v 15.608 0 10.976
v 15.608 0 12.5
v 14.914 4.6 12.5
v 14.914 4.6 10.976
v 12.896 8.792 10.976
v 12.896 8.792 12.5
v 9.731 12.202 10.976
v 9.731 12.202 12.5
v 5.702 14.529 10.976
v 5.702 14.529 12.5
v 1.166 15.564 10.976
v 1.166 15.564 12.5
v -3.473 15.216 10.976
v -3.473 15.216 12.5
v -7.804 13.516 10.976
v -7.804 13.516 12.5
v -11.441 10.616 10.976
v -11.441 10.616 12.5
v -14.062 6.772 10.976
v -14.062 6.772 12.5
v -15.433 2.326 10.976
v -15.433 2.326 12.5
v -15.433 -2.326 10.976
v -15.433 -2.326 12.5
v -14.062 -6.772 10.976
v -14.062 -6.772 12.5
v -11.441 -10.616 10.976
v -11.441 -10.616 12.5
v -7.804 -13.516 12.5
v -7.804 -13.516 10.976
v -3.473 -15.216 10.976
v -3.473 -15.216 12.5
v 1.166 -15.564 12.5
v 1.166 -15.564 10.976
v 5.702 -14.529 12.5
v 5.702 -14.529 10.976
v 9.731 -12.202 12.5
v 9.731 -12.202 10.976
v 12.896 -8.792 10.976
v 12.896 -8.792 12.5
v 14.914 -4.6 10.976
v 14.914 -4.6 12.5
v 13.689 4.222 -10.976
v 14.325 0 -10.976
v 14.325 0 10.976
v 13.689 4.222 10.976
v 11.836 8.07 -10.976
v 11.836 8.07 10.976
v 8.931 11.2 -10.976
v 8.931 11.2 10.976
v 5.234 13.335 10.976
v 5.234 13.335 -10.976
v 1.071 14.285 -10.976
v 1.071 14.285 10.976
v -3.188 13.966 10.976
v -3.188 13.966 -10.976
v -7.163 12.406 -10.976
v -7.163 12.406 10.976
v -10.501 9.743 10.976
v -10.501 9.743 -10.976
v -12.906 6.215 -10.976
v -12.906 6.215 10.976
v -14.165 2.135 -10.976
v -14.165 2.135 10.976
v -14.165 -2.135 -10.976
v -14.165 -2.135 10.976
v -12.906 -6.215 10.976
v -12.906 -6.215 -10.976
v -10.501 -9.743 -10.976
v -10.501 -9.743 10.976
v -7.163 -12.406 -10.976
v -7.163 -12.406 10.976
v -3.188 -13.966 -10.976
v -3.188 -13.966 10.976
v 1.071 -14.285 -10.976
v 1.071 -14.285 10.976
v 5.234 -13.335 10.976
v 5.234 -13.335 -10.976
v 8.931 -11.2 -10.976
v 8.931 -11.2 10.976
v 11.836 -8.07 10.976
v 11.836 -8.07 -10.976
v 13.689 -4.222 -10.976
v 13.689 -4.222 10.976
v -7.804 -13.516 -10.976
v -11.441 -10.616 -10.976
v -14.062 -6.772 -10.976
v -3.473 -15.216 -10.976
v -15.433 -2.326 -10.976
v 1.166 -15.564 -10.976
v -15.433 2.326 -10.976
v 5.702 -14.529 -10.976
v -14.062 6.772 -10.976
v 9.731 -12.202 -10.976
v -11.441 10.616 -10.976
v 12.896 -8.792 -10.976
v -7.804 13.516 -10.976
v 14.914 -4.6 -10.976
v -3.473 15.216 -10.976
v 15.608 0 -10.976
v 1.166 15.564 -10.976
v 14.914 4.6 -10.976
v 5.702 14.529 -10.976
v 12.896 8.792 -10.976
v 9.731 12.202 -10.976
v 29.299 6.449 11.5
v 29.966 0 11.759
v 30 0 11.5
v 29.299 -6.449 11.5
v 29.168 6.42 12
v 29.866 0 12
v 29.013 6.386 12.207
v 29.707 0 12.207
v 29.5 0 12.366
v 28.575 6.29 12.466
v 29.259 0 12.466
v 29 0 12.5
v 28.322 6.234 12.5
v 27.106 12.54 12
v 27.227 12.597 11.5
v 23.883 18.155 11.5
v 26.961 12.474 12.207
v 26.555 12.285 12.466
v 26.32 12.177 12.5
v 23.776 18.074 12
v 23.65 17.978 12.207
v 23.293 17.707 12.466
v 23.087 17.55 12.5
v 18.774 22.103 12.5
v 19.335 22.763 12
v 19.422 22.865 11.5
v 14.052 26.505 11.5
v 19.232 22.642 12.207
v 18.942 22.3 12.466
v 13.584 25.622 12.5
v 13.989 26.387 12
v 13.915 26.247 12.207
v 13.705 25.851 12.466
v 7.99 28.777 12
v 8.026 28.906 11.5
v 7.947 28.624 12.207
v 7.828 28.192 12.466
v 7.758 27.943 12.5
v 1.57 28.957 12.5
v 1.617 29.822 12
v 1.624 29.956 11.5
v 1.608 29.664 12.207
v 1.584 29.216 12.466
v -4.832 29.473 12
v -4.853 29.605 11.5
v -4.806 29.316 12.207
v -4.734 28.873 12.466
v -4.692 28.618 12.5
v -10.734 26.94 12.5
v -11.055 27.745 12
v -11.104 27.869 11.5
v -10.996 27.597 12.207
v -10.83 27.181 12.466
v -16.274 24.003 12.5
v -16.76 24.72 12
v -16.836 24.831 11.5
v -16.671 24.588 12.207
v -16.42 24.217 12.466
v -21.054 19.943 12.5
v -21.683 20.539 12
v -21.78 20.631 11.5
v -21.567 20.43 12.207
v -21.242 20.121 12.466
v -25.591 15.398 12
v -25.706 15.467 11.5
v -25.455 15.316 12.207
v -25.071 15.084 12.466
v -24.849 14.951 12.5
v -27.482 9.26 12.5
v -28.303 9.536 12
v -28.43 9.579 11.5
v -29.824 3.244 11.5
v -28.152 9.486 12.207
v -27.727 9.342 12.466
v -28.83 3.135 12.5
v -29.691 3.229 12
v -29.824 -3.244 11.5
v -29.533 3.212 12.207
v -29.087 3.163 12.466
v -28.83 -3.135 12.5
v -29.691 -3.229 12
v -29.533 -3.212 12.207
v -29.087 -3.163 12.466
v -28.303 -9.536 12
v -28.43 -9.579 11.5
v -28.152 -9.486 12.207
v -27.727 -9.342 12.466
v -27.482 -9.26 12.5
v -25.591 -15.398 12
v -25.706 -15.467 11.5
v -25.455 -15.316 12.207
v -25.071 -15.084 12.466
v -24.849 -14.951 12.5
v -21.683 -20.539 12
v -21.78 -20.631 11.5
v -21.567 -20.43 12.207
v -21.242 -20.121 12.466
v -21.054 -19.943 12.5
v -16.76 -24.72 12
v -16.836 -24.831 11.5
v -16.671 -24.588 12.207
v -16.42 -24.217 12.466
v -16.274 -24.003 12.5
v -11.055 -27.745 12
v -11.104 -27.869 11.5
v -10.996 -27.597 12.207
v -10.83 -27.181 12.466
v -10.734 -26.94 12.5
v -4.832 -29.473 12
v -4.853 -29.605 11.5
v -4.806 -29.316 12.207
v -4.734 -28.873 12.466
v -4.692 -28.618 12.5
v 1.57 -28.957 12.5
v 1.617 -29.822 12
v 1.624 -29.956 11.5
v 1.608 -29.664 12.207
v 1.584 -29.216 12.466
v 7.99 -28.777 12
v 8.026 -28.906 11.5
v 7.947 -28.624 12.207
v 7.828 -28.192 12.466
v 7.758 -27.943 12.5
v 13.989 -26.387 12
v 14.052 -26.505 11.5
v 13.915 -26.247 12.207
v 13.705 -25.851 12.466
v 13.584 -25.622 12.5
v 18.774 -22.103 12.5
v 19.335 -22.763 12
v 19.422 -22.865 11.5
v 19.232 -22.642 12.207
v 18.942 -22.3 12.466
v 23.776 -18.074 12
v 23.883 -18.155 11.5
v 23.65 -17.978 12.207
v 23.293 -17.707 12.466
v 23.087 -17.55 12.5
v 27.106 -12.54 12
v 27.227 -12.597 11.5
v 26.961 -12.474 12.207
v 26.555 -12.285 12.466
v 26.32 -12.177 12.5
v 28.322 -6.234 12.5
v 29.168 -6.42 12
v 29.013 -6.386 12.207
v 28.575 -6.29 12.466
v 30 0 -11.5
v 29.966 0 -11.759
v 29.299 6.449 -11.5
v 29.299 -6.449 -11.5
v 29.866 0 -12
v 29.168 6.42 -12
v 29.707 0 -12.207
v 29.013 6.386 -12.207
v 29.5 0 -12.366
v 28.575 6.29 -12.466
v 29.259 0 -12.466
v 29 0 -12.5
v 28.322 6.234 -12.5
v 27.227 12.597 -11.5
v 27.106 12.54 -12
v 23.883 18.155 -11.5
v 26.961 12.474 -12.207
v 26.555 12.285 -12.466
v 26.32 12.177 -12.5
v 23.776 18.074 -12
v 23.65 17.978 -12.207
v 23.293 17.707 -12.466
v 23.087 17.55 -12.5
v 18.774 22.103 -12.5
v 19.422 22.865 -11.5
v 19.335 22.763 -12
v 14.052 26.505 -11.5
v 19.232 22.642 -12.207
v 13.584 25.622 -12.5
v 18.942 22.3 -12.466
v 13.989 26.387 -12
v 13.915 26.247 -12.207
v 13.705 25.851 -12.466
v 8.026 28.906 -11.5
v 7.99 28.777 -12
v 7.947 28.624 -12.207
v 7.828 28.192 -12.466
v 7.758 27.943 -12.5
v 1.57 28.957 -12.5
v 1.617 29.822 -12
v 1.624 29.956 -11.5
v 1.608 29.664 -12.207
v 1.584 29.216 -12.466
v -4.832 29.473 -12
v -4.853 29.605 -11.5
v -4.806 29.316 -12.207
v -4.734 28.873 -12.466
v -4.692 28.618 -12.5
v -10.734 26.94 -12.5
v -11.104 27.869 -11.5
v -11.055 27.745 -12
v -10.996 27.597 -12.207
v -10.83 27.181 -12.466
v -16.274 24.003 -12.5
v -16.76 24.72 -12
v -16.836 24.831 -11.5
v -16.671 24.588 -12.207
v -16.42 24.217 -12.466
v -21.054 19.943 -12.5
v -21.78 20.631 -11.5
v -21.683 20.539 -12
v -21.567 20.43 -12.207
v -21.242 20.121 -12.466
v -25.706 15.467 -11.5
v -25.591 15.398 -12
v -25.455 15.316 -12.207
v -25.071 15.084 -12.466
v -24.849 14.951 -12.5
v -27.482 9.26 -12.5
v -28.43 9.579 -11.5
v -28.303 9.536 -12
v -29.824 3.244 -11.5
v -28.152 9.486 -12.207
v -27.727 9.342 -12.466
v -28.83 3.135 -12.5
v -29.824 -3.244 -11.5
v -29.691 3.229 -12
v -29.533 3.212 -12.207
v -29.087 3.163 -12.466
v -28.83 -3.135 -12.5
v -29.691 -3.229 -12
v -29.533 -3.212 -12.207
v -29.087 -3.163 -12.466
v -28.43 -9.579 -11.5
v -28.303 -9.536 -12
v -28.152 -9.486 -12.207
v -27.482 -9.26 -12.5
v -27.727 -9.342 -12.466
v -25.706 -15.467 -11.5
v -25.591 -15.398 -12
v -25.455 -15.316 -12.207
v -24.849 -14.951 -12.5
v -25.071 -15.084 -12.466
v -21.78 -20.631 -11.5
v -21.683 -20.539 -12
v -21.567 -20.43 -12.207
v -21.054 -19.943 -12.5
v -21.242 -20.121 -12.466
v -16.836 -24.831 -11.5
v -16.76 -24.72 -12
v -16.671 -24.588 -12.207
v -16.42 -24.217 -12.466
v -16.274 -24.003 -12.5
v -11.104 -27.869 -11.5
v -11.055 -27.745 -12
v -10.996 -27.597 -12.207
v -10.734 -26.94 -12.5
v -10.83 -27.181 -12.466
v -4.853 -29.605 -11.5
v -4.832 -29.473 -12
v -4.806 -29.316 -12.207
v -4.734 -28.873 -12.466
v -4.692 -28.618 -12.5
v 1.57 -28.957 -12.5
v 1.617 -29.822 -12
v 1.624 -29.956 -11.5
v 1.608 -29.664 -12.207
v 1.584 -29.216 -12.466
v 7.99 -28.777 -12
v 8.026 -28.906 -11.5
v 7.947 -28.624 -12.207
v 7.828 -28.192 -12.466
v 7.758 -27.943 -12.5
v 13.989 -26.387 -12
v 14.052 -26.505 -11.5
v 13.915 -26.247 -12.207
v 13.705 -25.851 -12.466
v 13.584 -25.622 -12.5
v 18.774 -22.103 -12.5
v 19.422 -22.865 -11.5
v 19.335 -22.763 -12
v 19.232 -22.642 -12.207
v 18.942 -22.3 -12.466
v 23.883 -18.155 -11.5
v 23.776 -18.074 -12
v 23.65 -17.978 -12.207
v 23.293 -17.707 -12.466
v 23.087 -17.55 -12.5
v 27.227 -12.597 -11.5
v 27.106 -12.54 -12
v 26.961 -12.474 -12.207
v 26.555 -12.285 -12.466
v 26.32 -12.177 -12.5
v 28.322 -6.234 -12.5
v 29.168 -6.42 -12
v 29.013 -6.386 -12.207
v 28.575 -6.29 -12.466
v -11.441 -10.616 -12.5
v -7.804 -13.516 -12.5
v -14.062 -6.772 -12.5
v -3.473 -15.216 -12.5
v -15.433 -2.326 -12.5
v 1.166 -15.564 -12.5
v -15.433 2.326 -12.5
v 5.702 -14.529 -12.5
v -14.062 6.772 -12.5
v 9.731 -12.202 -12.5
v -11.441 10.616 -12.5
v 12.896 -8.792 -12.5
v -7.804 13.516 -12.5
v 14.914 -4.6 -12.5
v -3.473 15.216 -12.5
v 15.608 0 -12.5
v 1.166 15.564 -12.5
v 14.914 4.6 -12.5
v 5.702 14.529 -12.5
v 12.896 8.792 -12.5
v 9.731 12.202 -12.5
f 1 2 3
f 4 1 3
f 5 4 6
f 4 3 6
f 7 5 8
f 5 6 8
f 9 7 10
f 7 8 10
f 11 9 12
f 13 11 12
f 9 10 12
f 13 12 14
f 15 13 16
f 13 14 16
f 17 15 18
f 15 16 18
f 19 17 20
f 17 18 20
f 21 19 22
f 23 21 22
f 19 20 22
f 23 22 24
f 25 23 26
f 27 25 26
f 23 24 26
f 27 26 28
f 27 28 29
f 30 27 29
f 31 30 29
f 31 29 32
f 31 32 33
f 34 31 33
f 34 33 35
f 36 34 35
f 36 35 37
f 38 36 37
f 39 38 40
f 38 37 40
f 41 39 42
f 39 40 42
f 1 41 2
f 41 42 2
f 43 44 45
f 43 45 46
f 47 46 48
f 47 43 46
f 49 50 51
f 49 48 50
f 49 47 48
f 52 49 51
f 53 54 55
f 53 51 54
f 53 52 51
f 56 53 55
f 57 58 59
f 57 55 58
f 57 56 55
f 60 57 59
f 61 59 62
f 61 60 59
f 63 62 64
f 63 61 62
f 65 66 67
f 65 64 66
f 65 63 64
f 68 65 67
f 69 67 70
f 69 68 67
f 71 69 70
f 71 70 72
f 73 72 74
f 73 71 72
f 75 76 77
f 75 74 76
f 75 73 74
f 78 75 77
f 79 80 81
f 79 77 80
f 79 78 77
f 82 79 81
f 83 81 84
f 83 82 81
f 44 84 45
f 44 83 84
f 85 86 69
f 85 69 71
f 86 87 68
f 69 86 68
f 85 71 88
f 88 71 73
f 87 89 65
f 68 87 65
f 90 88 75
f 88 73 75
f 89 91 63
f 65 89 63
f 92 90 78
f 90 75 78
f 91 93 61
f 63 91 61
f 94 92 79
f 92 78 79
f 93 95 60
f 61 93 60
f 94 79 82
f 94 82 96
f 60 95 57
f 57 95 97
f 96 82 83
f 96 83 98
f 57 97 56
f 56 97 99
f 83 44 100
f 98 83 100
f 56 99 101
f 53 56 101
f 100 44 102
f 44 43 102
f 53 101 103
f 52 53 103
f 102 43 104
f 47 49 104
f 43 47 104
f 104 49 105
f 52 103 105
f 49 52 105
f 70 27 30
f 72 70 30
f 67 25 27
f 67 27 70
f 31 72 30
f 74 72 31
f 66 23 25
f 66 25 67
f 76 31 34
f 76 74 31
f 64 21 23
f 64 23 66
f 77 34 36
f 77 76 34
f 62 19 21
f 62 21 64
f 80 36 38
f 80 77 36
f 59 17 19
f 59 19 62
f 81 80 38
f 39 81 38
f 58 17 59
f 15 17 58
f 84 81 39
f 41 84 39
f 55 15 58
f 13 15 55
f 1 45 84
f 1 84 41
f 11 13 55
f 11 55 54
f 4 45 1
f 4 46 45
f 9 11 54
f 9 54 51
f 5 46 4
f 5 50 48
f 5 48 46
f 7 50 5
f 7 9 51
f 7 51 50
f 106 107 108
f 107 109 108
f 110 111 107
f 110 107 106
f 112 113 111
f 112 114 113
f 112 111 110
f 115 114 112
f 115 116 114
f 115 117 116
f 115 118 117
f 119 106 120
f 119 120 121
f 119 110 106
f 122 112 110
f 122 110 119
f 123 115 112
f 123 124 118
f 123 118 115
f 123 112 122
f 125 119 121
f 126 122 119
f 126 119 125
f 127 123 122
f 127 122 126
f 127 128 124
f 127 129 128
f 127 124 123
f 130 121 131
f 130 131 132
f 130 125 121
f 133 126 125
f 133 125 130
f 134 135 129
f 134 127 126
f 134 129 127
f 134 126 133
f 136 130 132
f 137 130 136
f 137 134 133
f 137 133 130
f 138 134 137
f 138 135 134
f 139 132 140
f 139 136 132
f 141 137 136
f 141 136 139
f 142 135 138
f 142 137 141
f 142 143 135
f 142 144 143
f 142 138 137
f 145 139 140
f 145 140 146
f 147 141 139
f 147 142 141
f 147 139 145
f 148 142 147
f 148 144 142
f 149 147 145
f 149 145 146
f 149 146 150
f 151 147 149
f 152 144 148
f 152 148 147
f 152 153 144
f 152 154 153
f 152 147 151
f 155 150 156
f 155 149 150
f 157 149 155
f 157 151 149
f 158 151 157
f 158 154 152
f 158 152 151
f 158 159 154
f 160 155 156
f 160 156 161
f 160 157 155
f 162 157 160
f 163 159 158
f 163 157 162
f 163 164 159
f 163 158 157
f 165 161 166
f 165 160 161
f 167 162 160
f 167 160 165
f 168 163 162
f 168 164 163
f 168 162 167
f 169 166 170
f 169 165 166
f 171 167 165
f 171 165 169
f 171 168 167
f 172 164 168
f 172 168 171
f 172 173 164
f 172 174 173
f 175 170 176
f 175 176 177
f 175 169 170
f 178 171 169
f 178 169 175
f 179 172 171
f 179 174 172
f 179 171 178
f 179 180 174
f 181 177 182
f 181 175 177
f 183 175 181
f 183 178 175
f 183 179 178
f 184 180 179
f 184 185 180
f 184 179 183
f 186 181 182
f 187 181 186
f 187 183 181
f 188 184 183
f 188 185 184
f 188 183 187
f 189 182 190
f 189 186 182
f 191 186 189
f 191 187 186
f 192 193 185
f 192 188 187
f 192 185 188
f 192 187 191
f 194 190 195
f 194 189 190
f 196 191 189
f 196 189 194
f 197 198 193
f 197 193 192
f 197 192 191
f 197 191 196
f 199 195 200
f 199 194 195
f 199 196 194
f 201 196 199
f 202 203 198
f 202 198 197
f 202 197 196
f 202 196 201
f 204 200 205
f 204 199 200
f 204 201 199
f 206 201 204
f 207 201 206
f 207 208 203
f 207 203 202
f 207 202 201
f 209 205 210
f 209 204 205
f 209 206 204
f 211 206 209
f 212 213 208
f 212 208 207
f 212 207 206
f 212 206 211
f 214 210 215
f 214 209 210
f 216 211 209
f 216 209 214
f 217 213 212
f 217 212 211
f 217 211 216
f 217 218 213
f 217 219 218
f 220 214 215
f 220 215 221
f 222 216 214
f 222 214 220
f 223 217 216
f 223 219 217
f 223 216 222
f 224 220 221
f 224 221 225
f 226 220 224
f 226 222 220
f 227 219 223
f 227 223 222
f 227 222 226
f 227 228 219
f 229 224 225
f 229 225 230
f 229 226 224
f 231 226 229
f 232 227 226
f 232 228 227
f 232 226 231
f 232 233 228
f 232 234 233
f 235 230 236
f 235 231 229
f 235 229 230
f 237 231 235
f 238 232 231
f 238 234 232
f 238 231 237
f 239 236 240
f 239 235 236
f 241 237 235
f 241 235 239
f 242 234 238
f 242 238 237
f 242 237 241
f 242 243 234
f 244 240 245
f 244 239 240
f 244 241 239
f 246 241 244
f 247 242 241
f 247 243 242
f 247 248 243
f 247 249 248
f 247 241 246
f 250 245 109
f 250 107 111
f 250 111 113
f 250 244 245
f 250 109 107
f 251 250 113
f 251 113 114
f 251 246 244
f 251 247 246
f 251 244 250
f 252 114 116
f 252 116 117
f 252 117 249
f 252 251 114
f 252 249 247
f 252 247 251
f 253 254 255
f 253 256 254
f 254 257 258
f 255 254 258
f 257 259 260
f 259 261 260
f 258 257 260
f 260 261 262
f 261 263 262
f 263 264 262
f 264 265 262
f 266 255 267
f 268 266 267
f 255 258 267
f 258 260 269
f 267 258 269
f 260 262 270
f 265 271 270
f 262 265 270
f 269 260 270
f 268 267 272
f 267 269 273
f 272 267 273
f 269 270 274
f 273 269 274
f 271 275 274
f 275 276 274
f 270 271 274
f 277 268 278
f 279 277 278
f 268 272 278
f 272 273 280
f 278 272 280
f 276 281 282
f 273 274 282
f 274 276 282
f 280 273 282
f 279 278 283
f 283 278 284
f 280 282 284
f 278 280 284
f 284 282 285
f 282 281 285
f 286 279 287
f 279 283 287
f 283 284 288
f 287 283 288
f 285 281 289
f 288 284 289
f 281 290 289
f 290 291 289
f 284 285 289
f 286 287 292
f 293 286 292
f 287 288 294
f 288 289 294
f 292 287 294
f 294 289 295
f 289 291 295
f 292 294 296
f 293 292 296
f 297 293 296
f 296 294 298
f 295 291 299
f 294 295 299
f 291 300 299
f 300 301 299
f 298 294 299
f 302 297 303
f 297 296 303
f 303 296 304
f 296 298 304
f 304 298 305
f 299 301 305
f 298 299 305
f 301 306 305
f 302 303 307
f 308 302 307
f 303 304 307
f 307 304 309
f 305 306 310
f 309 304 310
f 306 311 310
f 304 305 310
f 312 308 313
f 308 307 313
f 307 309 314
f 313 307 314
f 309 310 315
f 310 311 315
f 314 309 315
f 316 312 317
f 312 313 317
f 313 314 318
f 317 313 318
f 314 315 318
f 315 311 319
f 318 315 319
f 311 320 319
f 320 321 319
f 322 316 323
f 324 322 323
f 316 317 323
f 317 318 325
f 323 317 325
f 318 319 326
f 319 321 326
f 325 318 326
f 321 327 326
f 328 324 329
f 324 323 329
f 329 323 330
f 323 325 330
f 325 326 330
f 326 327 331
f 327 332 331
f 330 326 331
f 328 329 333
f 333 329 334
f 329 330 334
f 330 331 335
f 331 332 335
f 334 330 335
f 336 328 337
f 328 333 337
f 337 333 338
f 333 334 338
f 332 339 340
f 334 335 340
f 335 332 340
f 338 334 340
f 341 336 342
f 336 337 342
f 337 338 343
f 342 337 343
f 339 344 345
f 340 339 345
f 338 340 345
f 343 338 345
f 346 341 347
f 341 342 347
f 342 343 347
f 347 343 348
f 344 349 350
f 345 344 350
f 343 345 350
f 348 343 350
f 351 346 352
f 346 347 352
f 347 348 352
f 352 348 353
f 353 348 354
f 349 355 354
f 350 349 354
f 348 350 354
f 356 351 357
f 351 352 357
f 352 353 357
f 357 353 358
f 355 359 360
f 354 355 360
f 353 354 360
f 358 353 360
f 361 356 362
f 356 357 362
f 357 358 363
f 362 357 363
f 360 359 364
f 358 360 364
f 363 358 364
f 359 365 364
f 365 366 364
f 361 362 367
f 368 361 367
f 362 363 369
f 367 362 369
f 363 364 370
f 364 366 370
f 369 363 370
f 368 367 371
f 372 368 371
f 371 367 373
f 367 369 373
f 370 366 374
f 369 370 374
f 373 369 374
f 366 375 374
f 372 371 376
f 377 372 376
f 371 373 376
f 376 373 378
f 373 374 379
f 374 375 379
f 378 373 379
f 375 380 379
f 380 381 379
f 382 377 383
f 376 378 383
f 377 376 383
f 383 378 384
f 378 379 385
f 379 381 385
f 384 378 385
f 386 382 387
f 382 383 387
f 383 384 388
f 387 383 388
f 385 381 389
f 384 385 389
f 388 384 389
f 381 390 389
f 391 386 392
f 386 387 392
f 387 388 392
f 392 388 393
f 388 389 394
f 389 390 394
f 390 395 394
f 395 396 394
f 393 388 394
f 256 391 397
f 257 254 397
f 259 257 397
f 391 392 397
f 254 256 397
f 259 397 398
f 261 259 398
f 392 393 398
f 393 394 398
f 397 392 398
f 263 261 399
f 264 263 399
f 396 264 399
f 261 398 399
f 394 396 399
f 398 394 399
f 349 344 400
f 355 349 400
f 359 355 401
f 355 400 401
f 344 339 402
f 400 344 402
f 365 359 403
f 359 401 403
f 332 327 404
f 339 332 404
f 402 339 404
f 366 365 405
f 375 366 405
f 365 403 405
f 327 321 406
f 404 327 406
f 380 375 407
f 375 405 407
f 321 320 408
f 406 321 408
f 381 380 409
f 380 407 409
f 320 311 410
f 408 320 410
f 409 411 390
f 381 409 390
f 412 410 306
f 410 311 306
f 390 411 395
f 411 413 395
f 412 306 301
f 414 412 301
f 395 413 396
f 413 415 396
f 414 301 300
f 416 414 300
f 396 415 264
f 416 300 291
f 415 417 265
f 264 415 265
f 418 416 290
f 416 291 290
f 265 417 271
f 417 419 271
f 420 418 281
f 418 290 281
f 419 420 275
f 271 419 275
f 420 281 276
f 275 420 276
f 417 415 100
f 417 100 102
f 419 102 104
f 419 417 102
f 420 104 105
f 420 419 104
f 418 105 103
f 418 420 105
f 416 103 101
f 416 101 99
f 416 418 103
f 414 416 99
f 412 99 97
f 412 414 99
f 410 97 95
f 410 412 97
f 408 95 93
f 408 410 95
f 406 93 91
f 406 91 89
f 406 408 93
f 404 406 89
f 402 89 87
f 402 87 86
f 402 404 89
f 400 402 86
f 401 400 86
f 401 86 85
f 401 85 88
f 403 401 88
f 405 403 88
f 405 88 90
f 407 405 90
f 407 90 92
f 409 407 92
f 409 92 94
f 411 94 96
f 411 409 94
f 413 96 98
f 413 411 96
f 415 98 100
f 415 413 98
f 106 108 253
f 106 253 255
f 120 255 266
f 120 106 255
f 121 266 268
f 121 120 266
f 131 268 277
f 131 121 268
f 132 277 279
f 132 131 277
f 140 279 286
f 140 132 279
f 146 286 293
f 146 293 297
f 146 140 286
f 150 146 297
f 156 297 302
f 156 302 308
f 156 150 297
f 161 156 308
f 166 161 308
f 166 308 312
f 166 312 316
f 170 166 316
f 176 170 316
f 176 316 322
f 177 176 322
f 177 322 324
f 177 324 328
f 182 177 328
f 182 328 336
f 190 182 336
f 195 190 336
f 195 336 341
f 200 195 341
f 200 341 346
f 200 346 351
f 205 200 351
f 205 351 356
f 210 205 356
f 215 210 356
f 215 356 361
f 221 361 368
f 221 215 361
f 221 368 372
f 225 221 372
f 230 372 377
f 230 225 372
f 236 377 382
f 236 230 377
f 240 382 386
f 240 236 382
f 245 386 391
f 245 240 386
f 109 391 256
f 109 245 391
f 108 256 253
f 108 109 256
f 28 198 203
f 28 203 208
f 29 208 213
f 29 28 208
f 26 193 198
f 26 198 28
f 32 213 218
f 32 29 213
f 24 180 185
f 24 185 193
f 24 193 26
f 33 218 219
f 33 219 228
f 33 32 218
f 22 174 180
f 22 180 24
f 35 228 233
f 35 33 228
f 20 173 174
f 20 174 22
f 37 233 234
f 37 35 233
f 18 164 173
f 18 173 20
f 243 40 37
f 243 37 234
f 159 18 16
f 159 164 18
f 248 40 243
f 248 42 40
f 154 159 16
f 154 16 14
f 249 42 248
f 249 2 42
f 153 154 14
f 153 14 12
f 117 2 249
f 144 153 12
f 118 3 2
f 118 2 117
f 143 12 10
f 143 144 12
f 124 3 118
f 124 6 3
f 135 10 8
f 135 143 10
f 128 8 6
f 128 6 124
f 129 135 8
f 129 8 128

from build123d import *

# Parameters (mm, degrees)
SKETCH1_R           = 30
SKETCH1_R_2         = 14.325
BOSS_EXTRUDE1_DEPTH = 12.5
SKETCH3_R           = 15.6075
CUT_EXTRUDE1_DEPTH  = 1.524
FILLET1_R           = 1


with BuildPart() as part:
    # Sketch1 → Boss-Extrude1 (new, symmetric)
    with BuildSketch(Plane.XY):
        Circle(SKETCH1_R)
        Circle(SKETCH1_R_2, mode=Mode.SUBTRACT)
    extrude(amount=BOSS_EXTRUDE1_DEPTH, both=True)

    # Sketch3 → Cut-Extrude1 (cut)
    with BuildSketch(Plane.XY.offset(12.5)):
        Circle(SKETCH3_R)
    cut_extrude1 = extrude(amount=-CUT_EXTRUDE1_DEPTH, mode=Mode.SUBTRACT)

    # Mirror1: Cut-Extrude1 across plane
    add(cut_extrude1.mirror(Plane.XY), mode=Mode.SUBTRACT)

    # Fillet1
    fillet1_edges = [part.edges().sort_by_distance(p)[0] for p in [
        (-30, 0, -12.5),
        (-30, 0, 12.5),
    ]]
    fillet(fillet1_edges, radius=FILLET1_R)


solid = part.part
